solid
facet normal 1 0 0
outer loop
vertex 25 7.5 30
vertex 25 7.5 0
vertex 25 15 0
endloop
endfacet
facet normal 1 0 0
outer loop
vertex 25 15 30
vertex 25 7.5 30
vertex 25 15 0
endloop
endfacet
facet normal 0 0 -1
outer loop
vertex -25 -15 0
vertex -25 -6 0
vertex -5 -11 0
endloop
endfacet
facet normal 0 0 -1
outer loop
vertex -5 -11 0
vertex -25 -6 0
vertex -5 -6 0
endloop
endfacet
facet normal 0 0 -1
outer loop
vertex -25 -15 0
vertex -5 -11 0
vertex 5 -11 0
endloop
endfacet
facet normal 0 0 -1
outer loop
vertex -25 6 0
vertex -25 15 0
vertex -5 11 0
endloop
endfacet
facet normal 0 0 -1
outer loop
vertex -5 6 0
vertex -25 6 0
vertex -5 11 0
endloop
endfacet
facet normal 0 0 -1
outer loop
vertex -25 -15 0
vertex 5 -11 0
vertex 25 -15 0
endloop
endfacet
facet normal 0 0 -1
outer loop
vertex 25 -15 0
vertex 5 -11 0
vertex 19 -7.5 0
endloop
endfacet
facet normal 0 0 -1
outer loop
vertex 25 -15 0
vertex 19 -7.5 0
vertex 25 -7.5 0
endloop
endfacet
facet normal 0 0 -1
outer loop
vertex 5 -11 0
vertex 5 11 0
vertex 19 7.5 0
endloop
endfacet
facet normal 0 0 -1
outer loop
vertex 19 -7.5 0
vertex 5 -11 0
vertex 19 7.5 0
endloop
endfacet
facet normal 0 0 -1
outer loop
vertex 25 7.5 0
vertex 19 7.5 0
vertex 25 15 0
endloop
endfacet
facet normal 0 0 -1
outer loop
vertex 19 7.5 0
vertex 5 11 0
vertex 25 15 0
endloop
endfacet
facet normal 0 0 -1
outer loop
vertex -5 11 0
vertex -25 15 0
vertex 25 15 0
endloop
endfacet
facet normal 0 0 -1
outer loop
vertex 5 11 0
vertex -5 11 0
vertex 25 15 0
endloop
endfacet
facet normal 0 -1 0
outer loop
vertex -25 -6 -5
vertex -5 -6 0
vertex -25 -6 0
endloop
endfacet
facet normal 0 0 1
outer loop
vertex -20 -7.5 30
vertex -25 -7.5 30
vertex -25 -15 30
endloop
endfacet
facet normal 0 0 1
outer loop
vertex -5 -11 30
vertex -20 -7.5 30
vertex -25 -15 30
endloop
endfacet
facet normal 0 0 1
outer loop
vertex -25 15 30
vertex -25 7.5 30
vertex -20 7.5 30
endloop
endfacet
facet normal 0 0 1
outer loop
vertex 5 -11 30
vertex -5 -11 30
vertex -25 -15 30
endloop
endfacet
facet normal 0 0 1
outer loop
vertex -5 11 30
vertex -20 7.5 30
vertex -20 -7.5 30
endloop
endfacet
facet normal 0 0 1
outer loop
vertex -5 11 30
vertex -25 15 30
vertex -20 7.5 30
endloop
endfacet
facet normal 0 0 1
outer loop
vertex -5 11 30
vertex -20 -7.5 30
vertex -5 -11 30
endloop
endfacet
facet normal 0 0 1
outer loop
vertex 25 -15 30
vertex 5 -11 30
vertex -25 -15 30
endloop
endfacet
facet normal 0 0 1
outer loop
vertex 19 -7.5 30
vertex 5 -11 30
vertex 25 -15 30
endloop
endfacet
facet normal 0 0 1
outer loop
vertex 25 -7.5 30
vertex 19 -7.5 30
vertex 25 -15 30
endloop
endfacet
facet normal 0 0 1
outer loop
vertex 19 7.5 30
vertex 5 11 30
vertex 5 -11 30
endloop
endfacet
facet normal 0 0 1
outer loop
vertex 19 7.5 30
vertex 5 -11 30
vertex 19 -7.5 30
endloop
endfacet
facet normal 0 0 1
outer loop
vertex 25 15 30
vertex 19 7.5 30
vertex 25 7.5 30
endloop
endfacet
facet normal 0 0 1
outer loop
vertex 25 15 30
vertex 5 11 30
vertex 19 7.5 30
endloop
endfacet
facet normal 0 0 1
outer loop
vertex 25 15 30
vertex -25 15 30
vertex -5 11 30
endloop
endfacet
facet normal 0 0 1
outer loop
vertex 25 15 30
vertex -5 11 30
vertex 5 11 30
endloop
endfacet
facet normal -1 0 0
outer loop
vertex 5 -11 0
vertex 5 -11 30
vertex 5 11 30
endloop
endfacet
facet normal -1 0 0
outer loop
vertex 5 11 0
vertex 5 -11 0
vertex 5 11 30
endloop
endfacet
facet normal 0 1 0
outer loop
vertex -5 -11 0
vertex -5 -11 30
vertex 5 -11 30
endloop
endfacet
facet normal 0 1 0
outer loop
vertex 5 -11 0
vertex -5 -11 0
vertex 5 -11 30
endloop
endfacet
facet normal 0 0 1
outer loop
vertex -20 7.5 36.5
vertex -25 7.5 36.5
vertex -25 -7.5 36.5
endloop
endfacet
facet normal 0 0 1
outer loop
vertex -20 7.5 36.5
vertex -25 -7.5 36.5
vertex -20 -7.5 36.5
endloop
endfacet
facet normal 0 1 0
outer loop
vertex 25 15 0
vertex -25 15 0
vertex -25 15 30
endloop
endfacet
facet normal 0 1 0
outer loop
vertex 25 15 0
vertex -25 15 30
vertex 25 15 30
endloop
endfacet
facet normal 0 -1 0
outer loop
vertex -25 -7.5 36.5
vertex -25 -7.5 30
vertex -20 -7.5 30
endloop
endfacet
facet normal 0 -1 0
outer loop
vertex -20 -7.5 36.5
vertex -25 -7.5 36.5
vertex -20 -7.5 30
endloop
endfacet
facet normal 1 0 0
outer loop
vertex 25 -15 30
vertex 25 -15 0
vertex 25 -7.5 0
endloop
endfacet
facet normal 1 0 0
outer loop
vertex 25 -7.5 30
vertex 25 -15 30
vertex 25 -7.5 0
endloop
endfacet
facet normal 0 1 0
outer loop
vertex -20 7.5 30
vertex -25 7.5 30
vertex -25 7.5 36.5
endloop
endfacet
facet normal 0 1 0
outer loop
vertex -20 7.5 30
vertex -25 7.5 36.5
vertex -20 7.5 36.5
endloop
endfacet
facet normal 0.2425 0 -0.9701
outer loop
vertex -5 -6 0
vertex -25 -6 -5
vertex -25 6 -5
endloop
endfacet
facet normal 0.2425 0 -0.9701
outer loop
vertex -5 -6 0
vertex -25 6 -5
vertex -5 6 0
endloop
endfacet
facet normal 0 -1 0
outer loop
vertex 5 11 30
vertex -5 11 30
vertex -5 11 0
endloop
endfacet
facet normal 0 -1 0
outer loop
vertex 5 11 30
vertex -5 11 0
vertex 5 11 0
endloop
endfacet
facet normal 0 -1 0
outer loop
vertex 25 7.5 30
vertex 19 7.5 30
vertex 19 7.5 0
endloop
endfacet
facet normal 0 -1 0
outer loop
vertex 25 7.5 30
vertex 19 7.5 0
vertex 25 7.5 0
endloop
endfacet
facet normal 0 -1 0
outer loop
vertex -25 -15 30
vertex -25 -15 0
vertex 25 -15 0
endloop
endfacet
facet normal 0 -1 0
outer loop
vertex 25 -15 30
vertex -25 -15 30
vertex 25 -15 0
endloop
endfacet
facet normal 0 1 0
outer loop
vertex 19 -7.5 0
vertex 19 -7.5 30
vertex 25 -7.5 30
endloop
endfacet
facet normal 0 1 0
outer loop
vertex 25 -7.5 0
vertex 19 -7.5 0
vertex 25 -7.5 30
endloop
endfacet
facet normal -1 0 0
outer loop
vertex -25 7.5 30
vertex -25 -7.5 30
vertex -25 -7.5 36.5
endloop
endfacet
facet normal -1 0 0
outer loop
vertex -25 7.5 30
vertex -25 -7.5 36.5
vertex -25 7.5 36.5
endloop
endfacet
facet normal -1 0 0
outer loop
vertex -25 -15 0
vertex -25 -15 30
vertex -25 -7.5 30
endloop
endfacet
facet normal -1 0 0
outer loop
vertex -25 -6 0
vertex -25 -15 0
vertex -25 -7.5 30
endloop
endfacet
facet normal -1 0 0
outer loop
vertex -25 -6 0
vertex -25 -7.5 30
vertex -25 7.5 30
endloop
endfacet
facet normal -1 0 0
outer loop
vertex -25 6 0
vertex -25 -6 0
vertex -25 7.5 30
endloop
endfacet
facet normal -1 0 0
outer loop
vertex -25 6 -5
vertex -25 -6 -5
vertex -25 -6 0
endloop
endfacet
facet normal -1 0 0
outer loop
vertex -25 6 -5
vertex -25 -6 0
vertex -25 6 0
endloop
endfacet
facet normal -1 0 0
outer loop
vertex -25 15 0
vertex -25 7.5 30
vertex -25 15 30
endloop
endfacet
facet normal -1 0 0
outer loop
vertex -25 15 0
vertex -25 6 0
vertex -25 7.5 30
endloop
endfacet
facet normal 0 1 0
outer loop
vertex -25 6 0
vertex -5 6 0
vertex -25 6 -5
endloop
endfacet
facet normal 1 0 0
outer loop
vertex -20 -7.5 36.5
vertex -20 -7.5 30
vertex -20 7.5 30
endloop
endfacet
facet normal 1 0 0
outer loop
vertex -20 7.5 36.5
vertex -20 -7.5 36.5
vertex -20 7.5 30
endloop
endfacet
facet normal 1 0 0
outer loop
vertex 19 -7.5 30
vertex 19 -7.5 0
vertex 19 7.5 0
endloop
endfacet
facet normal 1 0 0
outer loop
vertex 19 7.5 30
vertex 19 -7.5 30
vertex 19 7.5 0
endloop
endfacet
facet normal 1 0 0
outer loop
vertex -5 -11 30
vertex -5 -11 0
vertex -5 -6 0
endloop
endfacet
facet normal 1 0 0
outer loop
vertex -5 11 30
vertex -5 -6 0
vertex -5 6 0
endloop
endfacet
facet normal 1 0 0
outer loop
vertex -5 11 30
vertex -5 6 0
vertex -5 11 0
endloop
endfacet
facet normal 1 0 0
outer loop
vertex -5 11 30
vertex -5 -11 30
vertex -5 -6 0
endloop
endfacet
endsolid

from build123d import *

# Parameters (mm, degrees)
SKETCH_1_W           = 50
SKETCH_1_H           = 30
EXTRUDE_1_DEPTH      = 30
SKETCH_2_W           = 10
SKETCH_2_H           = 22
SKETCH_2_W_2         = 6
SKETCH_2_H_2         = 15
CUT_EXTRUDE_1_DEPTH  = 42.833001327
SKETCH_3_W           = 5
SKETCH_3_H           = 15
EXTRUDE_2_DEPTH      = 6.5
EXTRUDE_3_DEPTH      = 6
EXTRUDE_3_DEPTH_BACK = 6


with BuildPart() as part:
    # Эскиз1 → Бобышка-Вытянуть1 (new body)
    with BuildSketch(Plane.XY):
        Rectangle(SKETCH_1_W, SKETCH_1_H)
    extrude(amount=EXTRUDE_1_DEPTH)

    # Эскиз2 → Вырез-Вытянуть1 (cut, through all)
    with BuildSketch(Plane.XY.offset(30)):
        Rectangle(SKETCH_2_W, SKETCH_2_H)
        with Locations((22, 0)):
            Rectangle(SKETCH_2_W_2, SKETCH_2_H_2)
    extrude(amount=-CUT_EXTRUDE_1_DEPTH, mode=Mode.SUBTRACT)

    # Эскиз3 → Бобышка-Вытянуть2 (add)
    with BuildSketch(Plane.XY.offset(30)):
        with Locations((-22.5, 0)):
            Rectangle(SKETCH_3_W, SKETCH_3_H)
    extrude(amount=EXTRUDE_2_DEPTH)

    # Эскиз4 → Бобышка-Вытянуть3 (add, two sides: drawn at the far end of the back side and taken through both)
    with BuildSketch(Plane(origin=(0, 0, 0), x_dir=(1, 0, 0), z_dir=(0, 1, 0)).offset(-EXTRUDE_3_DEPTH_BACK)):
        Polygon((-25, 0), (-25, 5), (-5, 0), align=None)
    extrude(amount=EXTRUDE_3_DEPTH + EXTRUDE_3_DEPTH_BACK)


solid = part.part
